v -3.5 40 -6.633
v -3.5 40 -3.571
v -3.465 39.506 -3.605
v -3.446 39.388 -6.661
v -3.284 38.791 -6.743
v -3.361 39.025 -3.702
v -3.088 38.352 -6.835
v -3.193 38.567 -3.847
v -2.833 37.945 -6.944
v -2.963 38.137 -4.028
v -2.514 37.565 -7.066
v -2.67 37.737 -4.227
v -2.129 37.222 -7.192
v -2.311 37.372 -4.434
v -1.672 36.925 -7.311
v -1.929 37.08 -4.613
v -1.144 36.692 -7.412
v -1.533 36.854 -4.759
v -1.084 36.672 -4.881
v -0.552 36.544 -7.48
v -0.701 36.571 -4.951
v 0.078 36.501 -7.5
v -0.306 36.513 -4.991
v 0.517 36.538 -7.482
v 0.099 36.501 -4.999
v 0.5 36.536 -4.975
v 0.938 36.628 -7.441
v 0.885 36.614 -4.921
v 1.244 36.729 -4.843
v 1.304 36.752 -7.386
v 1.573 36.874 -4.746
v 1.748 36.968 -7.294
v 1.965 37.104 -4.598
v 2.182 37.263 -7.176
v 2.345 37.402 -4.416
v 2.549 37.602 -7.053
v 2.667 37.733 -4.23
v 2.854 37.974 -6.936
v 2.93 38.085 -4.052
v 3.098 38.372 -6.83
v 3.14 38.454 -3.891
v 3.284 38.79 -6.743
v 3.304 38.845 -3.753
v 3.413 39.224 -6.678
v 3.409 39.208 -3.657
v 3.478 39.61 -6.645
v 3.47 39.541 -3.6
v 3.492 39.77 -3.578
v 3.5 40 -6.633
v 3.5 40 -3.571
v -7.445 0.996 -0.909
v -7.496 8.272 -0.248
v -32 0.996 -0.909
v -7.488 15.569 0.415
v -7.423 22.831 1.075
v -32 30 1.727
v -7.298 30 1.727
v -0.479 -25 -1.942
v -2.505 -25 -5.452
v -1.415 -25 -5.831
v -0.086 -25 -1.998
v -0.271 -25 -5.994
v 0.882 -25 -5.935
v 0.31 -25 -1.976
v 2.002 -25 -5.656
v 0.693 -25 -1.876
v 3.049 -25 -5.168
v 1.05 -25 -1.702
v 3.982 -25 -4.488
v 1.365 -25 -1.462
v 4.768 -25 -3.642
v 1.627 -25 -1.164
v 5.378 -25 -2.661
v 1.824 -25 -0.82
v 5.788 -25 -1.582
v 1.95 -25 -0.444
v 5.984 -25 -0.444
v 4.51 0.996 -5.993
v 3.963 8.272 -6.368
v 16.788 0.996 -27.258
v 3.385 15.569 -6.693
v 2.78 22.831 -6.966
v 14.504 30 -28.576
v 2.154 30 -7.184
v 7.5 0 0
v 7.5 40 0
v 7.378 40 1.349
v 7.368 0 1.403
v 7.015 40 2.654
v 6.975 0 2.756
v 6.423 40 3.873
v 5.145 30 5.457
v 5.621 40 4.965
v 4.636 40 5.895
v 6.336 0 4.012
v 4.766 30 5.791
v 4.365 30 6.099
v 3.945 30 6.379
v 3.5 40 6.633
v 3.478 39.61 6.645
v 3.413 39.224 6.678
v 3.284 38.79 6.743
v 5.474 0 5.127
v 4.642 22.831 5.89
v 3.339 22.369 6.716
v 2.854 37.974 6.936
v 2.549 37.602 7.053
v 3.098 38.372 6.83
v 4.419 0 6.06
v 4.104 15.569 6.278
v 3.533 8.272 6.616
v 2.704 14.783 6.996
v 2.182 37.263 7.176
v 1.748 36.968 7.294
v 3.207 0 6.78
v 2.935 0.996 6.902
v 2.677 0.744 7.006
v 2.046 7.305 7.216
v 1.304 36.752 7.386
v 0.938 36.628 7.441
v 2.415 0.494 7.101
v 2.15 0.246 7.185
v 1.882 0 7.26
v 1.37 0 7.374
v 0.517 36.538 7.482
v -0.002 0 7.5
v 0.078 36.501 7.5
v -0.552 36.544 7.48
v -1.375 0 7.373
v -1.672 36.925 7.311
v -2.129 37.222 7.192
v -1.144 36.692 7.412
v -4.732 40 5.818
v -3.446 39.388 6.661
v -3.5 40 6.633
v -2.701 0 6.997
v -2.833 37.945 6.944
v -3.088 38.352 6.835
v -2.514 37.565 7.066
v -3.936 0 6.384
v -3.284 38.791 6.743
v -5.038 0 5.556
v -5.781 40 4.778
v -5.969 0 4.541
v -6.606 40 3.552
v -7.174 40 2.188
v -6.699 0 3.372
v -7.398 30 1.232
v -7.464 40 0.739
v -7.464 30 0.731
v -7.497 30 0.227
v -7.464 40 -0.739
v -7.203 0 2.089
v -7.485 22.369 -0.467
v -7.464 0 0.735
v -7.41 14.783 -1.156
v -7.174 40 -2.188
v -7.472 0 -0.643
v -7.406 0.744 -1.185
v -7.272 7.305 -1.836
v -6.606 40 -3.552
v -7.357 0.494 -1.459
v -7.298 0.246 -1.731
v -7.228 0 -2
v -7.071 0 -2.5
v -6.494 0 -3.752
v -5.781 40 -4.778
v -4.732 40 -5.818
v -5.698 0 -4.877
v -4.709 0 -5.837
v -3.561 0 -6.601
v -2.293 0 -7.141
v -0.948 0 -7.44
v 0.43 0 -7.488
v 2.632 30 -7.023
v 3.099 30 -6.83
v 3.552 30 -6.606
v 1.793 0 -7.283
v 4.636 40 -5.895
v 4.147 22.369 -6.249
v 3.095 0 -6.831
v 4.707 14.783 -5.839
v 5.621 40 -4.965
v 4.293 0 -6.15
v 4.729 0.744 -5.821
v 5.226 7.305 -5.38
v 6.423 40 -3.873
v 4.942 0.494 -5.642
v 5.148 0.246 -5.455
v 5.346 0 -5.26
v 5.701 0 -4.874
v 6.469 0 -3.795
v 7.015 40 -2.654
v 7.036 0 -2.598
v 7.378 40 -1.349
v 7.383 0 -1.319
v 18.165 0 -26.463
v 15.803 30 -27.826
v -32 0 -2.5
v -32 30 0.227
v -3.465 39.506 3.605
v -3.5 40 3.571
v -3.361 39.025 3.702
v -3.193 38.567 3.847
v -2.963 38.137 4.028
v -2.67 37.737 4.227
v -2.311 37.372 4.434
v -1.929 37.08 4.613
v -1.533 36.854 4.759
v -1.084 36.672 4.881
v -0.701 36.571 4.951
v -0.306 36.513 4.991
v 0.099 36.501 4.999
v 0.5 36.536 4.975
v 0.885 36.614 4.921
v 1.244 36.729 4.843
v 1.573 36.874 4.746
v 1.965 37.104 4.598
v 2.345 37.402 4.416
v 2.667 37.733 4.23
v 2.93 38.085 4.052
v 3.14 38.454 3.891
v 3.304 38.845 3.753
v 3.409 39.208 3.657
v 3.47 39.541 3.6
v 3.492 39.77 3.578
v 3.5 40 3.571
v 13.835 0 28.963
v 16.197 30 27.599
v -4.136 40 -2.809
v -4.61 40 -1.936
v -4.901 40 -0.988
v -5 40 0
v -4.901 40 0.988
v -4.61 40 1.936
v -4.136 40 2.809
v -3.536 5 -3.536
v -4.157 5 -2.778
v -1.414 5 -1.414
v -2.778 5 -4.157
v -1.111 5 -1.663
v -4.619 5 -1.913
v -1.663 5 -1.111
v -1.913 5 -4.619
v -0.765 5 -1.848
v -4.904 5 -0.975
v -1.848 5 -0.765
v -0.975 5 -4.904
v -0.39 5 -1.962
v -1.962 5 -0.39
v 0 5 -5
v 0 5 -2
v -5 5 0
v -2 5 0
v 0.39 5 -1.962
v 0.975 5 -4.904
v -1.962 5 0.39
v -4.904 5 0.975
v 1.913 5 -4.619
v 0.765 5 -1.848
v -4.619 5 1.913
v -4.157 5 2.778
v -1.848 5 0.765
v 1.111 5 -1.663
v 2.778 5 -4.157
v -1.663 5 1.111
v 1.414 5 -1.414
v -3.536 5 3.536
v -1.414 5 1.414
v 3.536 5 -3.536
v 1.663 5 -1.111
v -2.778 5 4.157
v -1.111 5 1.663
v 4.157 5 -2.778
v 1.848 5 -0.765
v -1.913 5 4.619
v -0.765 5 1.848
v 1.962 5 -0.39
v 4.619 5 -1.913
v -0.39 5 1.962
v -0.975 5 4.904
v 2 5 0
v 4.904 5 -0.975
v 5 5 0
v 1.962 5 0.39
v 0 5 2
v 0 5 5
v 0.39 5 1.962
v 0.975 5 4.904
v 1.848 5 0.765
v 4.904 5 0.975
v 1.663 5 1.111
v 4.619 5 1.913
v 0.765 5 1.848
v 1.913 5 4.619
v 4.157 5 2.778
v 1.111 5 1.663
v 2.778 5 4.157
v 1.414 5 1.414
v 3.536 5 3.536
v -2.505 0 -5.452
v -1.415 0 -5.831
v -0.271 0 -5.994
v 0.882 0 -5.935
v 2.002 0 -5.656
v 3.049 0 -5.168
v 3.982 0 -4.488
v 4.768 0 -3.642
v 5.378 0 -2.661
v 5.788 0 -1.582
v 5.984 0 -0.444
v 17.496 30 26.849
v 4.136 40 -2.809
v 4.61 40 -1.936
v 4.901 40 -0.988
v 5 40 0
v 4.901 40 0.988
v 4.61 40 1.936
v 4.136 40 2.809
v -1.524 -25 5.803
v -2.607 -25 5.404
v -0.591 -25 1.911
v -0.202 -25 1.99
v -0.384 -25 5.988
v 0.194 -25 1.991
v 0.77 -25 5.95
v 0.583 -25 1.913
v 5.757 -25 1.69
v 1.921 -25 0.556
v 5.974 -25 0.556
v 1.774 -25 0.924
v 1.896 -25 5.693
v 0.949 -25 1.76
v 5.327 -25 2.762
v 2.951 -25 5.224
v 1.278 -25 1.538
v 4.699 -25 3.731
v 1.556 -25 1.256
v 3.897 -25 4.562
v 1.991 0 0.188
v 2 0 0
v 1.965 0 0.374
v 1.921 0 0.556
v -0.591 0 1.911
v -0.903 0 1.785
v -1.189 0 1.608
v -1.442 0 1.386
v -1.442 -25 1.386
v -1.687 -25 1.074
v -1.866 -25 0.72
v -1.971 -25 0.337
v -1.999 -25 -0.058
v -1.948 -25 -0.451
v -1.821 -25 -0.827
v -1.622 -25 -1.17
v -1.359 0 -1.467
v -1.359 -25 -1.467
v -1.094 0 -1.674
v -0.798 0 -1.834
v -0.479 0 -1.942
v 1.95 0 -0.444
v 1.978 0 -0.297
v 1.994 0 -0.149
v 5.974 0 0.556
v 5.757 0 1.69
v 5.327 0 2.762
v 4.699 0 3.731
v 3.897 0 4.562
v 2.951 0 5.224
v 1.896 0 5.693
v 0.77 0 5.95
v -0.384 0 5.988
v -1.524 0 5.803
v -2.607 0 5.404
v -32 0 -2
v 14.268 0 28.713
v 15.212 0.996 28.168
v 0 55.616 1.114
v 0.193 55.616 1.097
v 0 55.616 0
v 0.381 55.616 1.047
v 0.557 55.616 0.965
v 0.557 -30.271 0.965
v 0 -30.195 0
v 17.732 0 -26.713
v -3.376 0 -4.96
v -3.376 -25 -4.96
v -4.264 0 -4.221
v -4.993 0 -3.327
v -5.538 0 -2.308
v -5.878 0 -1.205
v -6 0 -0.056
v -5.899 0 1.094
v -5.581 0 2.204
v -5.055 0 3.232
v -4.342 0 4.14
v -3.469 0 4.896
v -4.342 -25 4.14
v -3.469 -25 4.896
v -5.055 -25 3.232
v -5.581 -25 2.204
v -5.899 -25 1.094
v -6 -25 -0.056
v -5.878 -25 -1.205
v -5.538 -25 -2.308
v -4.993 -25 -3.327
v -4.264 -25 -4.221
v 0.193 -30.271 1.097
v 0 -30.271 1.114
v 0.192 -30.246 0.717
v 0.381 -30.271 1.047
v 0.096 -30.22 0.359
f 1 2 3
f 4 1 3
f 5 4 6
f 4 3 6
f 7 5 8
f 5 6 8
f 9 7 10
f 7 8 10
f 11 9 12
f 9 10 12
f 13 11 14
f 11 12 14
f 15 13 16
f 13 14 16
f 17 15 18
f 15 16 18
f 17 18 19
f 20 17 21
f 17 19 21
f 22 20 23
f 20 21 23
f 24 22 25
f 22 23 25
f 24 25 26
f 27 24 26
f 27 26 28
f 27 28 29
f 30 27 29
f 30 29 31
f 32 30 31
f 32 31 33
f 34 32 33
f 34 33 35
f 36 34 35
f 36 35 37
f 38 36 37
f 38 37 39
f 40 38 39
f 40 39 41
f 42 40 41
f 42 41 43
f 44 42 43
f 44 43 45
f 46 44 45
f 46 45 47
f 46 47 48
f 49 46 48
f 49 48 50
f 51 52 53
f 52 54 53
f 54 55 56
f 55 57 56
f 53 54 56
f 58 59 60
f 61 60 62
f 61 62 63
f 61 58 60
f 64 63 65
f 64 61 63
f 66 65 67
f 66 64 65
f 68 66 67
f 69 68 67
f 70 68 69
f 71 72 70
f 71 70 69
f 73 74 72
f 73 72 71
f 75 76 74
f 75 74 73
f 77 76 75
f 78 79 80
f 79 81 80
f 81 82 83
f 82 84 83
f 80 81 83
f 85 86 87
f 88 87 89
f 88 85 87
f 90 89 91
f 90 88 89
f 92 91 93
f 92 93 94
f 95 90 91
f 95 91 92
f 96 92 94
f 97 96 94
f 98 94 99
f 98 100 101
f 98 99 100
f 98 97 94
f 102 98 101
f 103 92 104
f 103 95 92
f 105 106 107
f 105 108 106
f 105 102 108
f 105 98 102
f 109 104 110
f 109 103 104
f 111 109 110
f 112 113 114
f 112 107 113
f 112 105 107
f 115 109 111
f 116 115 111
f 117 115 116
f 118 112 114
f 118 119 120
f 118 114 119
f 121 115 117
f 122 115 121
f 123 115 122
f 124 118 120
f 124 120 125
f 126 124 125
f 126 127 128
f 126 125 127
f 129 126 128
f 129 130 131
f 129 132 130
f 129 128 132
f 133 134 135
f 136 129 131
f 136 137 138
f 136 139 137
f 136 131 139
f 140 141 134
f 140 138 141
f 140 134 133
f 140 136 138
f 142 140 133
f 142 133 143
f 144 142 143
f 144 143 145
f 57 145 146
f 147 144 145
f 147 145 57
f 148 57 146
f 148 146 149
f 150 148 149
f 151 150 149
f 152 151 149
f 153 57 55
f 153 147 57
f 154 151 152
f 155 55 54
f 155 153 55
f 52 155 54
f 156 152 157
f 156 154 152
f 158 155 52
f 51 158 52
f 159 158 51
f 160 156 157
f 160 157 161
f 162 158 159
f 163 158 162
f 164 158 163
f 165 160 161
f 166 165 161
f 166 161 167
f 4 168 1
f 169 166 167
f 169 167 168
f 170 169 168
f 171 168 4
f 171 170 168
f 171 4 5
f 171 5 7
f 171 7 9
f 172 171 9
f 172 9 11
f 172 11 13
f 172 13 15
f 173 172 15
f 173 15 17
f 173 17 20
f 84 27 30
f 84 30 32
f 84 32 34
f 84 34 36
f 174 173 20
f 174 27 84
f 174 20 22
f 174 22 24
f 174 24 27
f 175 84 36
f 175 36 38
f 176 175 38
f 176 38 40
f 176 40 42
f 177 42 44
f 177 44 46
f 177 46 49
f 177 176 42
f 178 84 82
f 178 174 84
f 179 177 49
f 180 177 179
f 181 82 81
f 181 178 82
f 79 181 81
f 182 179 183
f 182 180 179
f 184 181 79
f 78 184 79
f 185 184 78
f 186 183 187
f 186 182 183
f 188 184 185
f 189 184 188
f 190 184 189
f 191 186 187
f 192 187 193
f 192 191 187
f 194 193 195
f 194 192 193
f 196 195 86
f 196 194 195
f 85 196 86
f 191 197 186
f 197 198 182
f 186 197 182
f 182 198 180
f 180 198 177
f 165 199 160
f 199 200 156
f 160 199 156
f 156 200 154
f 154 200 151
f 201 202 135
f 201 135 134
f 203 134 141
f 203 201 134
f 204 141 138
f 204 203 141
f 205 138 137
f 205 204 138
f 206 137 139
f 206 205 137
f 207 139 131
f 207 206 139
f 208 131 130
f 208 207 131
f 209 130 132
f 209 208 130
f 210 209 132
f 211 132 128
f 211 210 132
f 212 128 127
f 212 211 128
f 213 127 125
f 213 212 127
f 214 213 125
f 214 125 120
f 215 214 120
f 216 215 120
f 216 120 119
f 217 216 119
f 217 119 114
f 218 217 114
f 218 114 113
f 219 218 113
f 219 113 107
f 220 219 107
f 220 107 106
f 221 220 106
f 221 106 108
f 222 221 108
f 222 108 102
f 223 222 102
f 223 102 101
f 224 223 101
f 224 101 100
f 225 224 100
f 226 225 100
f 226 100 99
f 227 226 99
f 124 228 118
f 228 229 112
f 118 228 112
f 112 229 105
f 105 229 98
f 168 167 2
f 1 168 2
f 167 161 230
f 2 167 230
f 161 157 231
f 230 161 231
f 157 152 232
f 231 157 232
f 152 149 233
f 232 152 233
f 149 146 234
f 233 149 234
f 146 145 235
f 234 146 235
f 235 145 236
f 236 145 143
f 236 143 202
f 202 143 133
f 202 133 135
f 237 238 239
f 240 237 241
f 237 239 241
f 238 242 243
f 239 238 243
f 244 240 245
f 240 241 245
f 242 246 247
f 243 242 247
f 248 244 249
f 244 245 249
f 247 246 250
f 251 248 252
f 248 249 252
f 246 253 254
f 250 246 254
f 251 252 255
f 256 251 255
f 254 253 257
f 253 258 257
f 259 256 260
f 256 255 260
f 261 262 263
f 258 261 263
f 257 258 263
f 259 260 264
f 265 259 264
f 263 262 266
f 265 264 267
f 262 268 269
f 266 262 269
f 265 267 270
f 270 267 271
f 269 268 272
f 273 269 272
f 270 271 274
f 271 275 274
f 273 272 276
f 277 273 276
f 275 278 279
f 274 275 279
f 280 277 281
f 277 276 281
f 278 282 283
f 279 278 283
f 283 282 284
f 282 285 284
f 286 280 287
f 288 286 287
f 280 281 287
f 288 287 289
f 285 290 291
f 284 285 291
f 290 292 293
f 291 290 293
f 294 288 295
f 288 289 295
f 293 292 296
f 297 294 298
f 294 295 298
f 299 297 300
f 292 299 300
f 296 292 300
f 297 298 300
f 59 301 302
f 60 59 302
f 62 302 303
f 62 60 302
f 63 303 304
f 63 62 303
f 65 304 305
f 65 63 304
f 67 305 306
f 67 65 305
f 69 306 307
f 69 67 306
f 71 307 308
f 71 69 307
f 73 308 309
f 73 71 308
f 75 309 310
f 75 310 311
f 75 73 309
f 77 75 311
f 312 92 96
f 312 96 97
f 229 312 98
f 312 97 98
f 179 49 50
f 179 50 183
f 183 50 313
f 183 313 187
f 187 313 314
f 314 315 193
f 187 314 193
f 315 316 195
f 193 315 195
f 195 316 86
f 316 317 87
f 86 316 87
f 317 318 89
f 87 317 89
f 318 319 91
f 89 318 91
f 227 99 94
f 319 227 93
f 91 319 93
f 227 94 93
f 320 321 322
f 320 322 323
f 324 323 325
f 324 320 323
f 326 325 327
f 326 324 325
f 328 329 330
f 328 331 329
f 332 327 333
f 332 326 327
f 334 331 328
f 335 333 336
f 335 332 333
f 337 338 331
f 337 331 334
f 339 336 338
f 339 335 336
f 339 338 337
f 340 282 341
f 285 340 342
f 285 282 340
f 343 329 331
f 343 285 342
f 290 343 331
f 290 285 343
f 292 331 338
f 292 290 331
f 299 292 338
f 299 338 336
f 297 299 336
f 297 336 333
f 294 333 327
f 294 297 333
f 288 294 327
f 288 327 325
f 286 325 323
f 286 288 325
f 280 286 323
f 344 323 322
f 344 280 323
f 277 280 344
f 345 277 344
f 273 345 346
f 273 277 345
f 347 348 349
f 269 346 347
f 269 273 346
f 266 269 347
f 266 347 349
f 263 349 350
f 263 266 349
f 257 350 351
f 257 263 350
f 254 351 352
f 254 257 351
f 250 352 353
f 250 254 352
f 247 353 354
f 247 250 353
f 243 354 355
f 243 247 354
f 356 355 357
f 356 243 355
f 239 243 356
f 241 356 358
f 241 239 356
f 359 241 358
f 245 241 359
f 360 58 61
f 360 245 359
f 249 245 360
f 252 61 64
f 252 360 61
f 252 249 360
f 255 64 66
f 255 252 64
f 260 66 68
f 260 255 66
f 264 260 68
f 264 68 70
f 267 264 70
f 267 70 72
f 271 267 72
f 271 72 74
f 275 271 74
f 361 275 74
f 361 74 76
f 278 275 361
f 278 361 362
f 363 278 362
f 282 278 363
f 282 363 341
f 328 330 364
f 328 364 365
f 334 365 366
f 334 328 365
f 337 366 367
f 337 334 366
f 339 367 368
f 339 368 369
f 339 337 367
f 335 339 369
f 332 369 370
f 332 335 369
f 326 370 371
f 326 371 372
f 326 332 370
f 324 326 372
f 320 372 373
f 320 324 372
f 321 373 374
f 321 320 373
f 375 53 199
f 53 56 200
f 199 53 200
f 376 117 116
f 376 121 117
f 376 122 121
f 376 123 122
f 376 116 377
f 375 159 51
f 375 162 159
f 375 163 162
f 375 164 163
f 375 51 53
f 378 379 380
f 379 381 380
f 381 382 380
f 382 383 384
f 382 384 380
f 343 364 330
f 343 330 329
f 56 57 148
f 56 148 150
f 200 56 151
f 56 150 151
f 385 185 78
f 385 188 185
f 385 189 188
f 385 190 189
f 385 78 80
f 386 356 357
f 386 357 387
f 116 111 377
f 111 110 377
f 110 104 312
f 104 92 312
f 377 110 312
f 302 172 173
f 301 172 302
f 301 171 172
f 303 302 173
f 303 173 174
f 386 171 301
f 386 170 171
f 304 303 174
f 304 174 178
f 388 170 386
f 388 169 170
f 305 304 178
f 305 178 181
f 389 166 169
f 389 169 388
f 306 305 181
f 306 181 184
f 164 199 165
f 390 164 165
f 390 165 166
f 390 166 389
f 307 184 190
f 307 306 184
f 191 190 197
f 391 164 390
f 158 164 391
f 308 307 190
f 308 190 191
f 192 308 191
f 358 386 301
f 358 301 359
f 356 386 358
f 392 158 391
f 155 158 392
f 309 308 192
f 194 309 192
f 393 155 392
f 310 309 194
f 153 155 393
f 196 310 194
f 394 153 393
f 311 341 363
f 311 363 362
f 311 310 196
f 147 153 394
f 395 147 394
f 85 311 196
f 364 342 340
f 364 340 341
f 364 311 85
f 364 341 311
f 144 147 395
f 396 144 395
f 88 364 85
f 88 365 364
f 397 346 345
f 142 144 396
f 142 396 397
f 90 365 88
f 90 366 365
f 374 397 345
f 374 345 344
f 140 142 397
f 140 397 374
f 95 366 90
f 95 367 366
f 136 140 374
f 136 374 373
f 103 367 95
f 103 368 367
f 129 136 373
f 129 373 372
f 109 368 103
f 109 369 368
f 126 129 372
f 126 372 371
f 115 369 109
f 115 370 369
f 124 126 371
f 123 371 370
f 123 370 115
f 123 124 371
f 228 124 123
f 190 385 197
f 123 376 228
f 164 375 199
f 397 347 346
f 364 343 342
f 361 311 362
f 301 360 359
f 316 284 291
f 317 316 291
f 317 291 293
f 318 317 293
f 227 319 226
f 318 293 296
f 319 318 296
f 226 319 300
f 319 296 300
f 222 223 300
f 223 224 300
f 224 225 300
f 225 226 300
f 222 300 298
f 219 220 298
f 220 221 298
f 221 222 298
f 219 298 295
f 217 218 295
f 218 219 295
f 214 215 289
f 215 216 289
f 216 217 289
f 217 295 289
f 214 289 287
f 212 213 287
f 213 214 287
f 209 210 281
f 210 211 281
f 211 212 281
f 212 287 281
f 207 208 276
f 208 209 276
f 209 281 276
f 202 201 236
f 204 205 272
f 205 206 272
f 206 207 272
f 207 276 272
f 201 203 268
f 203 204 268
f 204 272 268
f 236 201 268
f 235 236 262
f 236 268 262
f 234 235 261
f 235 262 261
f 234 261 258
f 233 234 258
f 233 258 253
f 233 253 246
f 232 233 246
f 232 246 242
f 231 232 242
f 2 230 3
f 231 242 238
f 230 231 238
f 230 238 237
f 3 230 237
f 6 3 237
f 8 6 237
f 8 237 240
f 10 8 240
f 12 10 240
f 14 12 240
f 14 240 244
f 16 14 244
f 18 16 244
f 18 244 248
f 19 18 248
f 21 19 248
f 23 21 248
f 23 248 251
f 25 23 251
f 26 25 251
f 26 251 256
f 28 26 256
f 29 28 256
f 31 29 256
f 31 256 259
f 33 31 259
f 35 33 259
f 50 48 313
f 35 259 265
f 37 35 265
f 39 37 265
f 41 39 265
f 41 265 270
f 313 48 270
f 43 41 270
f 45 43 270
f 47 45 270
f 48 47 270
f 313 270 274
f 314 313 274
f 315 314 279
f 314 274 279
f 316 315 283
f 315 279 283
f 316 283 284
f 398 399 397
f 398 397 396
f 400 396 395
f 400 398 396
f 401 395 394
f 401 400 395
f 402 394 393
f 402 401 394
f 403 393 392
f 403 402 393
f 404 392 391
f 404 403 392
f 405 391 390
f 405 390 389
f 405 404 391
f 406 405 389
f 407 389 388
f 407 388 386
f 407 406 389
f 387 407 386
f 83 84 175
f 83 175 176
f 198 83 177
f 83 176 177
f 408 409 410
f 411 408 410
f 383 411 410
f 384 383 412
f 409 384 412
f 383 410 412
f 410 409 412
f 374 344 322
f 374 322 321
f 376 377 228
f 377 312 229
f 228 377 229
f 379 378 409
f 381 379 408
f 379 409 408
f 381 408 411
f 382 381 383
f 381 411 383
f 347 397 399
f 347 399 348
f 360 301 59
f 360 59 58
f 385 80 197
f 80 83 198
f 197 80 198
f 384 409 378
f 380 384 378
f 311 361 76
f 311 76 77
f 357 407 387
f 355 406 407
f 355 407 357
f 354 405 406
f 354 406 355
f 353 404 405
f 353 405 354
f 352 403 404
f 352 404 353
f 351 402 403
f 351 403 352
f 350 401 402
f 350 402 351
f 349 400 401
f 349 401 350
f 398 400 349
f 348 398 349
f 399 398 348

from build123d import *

# Parameters (mm, degrees)
F0_R           = 6
F0_R_2         = 5
F0_R_3         = 2
F1_DEPTH       = 25
F1_DEPTH_BACK  = 5
F0_R_4         = 7.5
F2_DEPTH       = 40
F4_DEPTH       = 25
F5_W           = 25
F5_H           = 1.5
F9_SIZE        = 1
F10_ANGLE      = 30
F11_COUNT      = 3
F12_R          = 3.5
F13_DEPTH      = 25
F13_DEPTH_BACK = 25


with BuildPart() as f1:
    # F0 (on Front) → F1 (new body, two sides)
    with BuildSketch(Plane.XZ) as f1_sk:
        Circle(F0_R)
        Circle(F0_R_2, mode=Mode.SUBTRACT)
        Circle(F0_R_2)
        Circle(F0_R_3, mode=Mode.SUBTRACT)
    extrude(amount=F1_DEPTH)
    extrude(f1_sk.sketch, amount=-F1_DEPTH_BACK)

    # F0 (on Front) → F2 (join)
    with BuildSketch(Plane.XZ):
        Circle(F0_R_4)
        Circle(F0_R, mode=Mode.SUBTRACT)
        Circle(F0_R)
        Circle(F0_R_2, mode=Mode.SUBTRACT)
    extrude(amount=-F2_DEPTH)

    # F3 (on Front) → F4 (cut)
    with BuildSketch(Plane.XZ):
        Polygon((0, 0), (0, 0.5562636638), (0.1912236103, 0.5562636638), (-3.1157130603, 6.2840459946), (-3.981738464, 5.7840459946), (-0.5773502692, -0.1125273276), (-0.3842869397, 0.2218681681), align=None)
        Polygon((7, 0.5562636638), (0.1912236103, 0.5562636638), (0.3842869397, 0.2218681681), (0, 0), (0.481738464, -0.2781318319), (0.3861266589, -0.4437363362), (7, -0.4437363362), align=None)
        Polygon((0, -0.4437363362), (0, 0), (-0.481738464, -0.2781318319), (-0.5773502692, -0.1125273276), (-3.8842869397, -5.8403096584), (-3.018261536, -6.3403096584), (0.3861266589, -0.4437363362), align=None)
    extrude(amount=F4_DEPTH, mode=Mode.SUBTRACT)

    # F7: sweep along a path in F6
    with BuildLine(Plane.YZ) as f7_path:
        Line((0, -1.7128828858), (30, 1.0140511738))
    # F5 (on Front) → F7 (sweep)
    with BuildSketch(Plane.XZ):
        with Locations((-19.5, -1.75)):
            Rectangle(F5_W, F5_H)
    sweep(path=f7_path.line)

    # F9
    f9_edges = [f1.edges().sort_by_distance(p)[0] for p in [
        (-19.716517, 0, -1),
    ]]
    chamfer(f9_edges, length=F9_SIZE)

    # F11: F1 ×3 about axis
    f11_axis = Axis((0, 12.7106998116, 0), (0, 1, 0))


with BuildPart() as f10:
    # F8 (on Right) → F10 (revolve)
    with BuildSketch(Plane.YZ):
        Polygon((-30.2714016289, 1.1140255956), (-30.1947593689, 0), (55.6161589921, 0), (55.6161589921, 1.1140255956), align=None)
    revolve(axis=Axis((0, 12.7106998116, 0), (0, 1, 0)), revolution_arc=F10_ANGLE)


with BuildPart() as f1_1:
    add(f1.part)
    for i in range(1, F11_COUNT):
        add(f1.part.rotate(f11_axis, i * 360 / F11_COUNT))

    # F12 (on Top) → F13 (cut, two sides)
    with BuildSketch(Plane.XY) as f13_sk:
        with Locations((0, 40)):
            Circle(F12_R)
    extrude(amount=-F13_DEPTH, mode=Mode.SUBTRACT)
    extrude(f13_sk.sketch, amount=F13_DEPTH_BACK, mode=Mode.SUBTRACT)


solid = Compound([f10.part, f1_1.part])
